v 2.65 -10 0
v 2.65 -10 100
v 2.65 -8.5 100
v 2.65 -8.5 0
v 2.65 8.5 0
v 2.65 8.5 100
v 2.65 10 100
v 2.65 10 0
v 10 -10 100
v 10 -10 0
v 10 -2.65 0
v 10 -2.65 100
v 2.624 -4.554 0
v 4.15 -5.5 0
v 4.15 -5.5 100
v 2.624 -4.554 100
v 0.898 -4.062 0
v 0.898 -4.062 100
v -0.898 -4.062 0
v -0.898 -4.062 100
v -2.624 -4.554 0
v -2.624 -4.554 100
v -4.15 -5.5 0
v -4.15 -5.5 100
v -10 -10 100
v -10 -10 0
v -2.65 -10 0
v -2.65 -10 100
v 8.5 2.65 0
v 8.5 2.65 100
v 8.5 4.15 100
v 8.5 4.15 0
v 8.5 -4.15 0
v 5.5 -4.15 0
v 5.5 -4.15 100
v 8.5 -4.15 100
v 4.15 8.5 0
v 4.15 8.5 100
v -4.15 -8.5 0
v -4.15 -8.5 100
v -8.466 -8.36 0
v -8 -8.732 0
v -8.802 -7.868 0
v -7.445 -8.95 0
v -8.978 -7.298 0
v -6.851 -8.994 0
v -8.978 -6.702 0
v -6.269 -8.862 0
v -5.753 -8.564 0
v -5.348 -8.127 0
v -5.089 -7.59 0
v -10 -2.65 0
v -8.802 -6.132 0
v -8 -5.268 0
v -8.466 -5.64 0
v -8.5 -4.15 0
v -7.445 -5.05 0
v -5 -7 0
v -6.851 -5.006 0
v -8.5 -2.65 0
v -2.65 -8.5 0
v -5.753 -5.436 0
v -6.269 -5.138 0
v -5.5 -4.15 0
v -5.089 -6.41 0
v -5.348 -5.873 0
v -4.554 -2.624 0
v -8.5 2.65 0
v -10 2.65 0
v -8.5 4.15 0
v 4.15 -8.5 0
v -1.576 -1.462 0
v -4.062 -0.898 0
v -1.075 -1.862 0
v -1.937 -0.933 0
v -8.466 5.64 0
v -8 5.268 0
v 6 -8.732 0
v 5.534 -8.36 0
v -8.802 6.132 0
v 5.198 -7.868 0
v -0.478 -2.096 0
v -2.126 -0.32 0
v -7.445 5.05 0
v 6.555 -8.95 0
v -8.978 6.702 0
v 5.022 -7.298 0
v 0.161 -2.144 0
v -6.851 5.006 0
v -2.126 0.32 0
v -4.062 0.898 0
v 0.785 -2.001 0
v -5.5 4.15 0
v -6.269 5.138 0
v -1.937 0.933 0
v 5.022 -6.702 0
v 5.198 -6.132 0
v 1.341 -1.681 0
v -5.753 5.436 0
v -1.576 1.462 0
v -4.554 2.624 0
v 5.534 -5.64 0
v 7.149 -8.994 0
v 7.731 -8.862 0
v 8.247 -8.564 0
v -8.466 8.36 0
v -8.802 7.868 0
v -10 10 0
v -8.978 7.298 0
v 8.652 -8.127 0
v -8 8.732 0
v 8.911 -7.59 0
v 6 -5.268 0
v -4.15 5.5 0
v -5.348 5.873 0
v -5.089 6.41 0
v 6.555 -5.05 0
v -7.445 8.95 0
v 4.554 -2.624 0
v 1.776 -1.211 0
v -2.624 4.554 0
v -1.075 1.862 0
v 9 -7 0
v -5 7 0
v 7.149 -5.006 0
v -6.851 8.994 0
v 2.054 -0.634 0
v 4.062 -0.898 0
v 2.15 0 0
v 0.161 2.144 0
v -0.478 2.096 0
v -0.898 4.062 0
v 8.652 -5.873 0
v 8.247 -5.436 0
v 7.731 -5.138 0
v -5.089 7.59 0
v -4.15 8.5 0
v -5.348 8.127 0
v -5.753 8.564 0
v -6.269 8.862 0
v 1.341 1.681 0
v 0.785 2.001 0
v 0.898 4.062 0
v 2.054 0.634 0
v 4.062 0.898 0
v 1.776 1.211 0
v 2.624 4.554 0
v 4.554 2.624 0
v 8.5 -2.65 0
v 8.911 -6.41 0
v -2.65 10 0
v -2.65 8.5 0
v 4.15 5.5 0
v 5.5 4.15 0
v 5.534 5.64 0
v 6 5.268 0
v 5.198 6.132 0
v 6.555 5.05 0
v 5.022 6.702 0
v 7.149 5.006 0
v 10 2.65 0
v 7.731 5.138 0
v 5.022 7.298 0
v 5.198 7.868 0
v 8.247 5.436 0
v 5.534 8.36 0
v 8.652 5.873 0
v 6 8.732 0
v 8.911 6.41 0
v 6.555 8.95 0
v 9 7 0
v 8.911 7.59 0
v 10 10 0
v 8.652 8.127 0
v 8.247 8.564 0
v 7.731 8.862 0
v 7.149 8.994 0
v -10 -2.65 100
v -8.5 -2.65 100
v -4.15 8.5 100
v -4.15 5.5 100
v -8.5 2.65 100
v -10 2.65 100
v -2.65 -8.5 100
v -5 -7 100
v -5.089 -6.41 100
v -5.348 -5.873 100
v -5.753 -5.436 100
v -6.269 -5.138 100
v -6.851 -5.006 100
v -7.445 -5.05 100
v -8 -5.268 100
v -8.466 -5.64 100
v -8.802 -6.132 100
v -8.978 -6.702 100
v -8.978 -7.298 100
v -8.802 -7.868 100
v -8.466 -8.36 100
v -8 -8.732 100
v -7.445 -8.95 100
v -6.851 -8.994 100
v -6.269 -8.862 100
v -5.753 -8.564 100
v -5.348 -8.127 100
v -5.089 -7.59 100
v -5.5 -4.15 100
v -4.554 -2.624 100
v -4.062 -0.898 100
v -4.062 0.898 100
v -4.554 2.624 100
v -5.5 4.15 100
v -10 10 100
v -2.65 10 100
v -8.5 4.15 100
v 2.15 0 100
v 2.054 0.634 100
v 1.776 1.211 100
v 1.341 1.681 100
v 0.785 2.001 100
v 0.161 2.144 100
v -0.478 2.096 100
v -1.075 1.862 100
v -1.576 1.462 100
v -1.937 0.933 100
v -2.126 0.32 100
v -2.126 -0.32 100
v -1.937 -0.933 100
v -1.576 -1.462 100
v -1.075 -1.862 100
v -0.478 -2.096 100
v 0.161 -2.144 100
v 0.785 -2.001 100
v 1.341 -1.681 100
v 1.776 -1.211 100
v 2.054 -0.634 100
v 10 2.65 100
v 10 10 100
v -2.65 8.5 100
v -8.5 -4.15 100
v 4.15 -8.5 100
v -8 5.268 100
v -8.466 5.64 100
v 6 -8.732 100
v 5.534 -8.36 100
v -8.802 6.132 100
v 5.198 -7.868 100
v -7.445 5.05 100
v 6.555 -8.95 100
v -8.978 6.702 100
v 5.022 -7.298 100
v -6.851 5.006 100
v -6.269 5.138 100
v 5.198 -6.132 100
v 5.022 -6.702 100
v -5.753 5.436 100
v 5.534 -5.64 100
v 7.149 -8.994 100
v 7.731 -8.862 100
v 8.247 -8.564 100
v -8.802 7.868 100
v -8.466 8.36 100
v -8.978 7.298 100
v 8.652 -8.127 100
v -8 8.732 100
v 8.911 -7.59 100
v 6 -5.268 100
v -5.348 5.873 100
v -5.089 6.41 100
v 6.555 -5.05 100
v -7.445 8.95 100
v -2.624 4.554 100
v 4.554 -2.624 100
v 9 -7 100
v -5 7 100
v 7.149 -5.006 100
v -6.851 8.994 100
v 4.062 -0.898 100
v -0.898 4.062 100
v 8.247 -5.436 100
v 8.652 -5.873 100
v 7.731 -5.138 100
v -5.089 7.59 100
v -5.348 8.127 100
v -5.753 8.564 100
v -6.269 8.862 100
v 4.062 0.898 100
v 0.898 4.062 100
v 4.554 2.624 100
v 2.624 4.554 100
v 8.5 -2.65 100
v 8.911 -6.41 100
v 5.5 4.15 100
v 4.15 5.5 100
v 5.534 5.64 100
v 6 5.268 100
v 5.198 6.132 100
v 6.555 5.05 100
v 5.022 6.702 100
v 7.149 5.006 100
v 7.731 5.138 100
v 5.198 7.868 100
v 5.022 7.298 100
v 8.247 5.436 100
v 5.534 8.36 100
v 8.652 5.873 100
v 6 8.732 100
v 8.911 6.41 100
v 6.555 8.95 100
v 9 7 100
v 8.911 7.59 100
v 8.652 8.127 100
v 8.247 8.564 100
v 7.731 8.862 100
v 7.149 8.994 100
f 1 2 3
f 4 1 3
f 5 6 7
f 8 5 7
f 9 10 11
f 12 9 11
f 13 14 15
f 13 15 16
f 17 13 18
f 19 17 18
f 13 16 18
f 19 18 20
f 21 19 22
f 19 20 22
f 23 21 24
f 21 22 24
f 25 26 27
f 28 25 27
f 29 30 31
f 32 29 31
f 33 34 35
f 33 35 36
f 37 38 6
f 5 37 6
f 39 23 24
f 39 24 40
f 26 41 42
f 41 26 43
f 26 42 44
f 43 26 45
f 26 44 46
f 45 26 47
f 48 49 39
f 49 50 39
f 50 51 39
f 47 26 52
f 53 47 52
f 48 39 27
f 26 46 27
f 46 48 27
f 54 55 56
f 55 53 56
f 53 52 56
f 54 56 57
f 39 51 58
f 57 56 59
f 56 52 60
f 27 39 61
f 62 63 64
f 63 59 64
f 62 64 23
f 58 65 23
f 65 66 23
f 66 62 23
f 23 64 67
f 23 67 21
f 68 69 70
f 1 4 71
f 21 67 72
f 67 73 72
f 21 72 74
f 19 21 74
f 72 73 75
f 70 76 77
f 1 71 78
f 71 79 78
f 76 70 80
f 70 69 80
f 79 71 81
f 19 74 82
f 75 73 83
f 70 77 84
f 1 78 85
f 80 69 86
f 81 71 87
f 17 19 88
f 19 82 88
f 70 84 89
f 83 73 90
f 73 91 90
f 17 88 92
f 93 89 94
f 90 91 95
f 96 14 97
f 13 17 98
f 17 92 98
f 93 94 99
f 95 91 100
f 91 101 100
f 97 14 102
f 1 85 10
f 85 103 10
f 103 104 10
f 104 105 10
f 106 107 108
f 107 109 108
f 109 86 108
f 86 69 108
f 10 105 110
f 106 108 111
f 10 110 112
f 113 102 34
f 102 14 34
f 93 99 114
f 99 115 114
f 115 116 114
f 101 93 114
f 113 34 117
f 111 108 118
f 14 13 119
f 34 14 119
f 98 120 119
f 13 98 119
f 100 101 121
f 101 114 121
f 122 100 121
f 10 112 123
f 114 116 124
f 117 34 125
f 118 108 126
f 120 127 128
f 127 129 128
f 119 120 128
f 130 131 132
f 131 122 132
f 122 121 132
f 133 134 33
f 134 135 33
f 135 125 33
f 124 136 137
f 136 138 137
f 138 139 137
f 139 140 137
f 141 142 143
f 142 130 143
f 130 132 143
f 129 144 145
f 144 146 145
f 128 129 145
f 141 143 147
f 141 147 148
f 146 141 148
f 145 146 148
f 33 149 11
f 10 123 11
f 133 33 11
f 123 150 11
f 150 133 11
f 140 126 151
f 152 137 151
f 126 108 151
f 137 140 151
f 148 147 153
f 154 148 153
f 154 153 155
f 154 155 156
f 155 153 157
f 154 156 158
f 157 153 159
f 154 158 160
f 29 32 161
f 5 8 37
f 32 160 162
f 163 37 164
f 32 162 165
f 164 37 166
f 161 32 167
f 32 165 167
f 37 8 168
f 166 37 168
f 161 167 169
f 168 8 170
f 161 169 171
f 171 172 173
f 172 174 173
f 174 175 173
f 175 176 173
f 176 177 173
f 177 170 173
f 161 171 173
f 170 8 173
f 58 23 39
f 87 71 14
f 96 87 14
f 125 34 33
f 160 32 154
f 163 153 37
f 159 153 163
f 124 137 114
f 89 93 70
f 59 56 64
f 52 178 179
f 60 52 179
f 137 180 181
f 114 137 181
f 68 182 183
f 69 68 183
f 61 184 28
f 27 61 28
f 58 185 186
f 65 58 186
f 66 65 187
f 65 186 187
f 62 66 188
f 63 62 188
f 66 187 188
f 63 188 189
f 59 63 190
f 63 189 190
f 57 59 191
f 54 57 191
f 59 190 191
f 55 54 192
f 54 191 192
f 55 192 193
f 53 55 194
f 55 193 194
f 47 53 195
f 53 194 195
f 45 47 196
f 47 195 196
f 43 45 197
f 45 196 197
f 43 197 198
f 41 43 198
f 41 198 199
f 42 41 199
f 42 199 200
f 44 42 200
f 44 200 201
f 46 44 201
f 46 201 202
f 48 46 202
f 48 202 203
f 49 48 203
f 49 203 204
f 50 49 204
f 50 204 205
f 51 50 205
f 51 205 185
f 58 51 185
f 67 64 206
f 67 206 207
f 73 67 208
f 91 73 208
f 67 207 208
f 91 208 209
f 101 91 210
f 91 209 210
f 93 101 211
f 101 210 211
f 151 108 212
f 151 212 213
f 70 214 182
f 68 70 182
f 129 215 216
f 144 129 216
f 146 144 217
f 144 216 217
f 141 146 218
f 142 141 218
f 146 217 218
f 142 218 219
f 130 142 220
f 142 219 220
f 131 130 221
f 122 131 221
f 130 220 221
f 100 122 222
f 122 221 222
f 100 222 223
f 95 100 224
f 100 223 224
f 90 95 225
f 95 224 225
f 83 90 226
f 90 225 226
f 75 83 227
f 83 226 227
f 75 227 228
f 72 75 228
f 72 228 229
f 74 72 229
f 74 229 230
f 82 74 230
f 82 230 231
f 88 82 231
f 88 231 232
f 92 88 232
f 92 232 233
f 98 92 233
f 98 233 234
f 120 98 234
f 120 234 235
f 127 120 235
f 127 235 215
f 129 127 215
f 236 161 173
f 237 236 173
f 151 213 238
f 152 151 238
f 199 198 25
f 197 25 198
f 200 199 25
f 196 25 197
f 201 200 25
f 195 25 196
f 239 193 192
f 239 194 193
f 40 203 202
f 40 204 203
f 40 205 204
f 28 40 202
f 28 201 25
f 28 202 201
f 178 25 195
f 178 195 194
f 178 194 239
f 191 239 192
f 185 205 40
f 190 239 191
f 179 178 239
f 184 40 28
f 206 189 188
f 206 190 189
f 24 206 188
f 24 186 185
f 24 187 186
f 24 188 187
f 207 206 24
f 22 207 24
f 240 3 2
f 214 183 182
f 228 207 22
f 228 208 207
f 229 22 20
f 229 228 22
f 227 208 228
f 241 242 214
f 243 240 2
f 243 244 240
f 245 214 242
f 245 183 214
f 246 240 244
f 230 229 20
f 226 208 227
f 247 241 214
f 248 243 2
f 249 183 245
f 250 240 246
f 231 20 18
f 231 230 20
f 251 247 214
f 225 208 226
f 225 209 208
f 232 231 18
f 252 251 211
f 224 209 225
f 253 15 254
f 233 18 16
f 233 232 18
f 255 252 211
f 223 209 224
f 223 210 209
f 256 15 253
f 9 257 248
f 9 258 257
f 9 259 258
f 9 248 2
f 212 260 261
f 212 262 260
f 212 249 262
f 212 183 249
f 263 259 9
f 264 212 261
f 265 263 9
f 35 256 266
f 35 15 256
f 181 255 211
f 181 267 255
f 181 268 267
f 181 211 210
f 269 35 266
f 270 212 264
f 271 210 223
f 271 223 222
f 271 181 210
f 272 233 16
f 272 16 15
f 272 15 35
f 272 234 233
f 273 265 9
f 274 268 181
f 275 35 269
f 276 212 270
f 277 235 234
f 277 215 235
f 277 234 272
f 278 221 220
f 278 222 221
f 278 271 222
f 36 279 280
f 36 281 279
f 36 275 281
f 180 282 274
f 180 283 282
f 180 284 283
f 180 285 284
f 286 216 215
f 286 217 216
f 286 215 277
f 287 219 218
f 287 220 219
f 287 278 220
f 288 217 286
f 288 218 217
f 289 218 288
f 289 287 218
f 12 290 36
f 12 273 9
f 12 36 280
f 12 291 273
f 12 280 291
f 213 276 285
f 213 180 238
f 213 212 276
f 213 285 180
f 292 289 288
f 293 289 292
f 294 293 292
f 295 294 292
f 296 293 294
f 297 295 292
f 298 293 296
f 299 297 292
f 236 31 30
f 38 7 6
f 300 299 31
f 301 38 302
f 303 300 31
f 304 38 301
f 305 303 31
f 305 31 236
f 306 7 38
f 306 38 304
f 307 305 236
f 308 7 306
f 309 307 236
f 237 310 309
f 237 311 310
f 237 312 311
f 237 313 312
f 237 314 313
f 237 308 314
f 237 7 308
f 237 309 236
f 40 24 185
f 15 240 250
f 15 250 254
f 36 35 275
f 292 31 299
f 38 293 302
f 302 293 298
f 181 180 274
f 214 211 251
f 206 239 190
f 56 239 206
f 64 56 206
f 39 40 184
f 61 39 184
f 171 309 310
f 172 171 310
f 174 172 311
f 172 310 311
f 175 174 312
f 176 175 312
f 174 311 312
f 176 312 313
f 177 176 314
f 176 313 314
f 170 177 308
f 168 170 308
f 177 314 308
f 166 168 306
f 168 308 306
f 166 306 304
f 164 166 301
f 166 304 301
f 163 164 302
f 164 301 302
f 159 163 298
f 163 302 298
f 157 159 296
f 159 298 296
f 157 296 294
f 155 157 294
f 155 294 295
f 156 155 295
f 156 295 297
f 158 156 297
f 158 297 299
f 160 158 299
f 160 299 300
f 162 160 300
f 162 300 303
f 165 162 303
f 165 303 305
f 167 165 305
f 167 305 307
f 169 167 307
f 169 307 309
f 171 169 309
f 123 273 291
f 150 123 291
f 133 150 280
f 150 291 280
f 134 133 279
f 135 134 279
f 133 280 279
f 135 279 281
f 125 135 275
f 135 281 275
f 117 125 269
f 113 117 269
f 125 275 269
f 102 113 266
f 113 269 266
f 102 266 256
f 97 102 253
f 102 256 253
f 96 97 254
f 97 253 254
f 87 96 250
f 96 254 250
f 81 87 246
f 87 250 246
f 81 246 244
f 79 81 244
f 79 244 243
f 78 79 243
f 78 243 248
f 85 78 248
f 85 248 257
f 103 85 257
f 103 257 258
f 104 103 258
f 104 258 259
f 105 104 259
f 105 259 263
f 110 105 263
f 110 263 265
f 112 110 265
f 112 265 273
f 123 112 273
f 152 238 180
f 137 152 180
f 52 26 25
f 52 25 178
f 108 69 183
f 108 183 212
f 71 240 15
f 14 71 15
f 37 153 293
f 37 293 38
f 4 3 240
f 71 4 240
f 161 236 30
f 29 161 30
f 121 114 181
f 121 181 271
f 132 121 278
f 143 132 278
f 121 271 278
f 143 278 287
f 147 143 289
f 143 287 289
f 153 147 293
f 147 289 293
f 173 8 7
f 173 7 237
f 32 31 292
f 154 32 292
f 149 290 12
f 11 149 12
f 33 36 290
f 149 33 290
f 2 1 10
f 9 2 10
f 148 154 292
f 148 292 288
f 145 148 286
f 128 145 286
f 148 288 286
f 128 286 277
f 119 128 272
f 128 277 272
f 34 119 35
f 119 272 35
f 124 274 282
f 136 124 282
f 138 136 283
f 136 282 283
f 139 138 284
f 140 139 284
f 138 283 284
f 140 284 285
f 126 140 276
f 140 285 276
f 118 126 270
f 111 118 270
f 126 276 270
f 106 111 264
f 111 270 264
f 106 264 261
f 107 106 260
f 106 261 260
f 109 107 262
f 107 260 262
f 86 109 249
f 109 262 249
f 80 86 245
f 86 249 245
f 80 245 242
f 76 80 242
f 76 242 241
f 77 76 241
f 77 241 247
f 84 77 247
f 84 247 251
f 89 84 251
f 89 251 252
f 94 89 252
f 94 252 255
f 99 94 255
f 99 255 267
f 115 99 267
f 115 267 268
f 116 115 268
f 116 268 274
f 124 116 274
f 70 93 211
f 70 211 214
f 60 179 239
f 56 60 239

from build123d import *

# Parameters (mm, degrees)
SKETCH_1_W          = 20
SKETCH_1_H          = 20
EXTRUDE_1_DEPTH     = 100
SKETCH_2_R          = 2.15
SKETCH_2_R_2        = 2
CUT_EXTRUDE_1_DEPTH = 101.995049384


with BuildPart() as part:
    # 스케치1 → 보스-돌출1 (new body)
    with BuildSketch(Plane.XY):
        Rectangle(SKETCH_1_W, SKETCH_1_H)
    extrude(amount=EXTRUDE_1_DEPTH)

    # 스케치2 → 컷-돌출1 (cut, through all)
    with BuildSketch(Plane.XY.offset(100)):
        Circle(SKETCH_2_R)
        with Locations((-7, 7)):
            Circle(SKETCH_2_R_2)
        with Locations((7, 7)):
            Circle(SKETCH_2_R_2)
        with Locations((7, -7)):
            Circle(SKETCH_2_R_2)
        with Locations((-7, -7)):
            Circle(SKETCH_2_R_2)
        with BuildLine():
            Line((-2.65, 10), (-2.65, 8.5))
            Line((-2.65, 8.5), (-4.15, 8.5))
            Line((-4.15, 8.5), (-4.15, 5.5))
            ThreePointArc((-4.15, 5.5), (0, 4), (4.15, 5.5))
            Line((4.15, 5.5), (4.15, 8.5))
            Line((4.15, 8.5), (2.65, 8.5))
            Line((2.65, 8.5), (2.65, 10))
            Line((2.65, 10), (-2.65, 10))
        make_face()
        with BuildLine():
            Line((10, 2.65), (8.5, 2.65))
            Line((8.5, 2.65), (8.5, 4.15))
            Line((8.5, 4.15), (5.5, 4.15))
            ThreePointArc((5.5, 4.15), (4, 0), (5.5, -4.15))
            Line((5.5, -4.15), (8.5, -4.15))
            Line((8.5, -4.15), (8.5, -2.65))
            Line((8.5, -2.65), (10, -2.65))
            Line((10, -2.65), (10, 2.65))
        make_face()
        with BuildLine():
            Line((2.65, -10), (2.65, -8.5))
            Line((2.65, -8.5), (4.15, -8.5))
            Line((4.15, -8.5), (4.15, -5.5))
            ThreePointArc((4.15, -5.5), (0, -4), (-4.15, -5.5))
            Line((-4.15, -5.5), (-4.15, -8.5))
            Line((-4.15, -8.5), (-2.65, -8.5))
            Line((-2.65, -8.5), (-2.65, -10))
            Line((-2.65, -10), (2.65, -10))
        make_face()
        with BuildLine():
            Line((-10, -2.65), (-8.5, -2.65))
            Line((-8.5, -2.65), (-8.5, -4.15))
            Line((-8.5, -4.15), (-5.5, -4.15))
            ThreePointArc((-5.5, -4.15), (-4, 0), (-5.5, 4.15))
            Line((-5.5, 4.15), (-8.5, 4.15))
            Line((-8.5, 4.15), (-8.5, 2.65))
            Line((-8.5, 2.65), (-10, 2.65))
            Line((-10, 2.65), (-10, -2.65))
        make_face()
    extrude(amount=-CUT_EXTRUDE_1_DEPTH, mode=Mode.SUBTRACT)


solid = part.part
